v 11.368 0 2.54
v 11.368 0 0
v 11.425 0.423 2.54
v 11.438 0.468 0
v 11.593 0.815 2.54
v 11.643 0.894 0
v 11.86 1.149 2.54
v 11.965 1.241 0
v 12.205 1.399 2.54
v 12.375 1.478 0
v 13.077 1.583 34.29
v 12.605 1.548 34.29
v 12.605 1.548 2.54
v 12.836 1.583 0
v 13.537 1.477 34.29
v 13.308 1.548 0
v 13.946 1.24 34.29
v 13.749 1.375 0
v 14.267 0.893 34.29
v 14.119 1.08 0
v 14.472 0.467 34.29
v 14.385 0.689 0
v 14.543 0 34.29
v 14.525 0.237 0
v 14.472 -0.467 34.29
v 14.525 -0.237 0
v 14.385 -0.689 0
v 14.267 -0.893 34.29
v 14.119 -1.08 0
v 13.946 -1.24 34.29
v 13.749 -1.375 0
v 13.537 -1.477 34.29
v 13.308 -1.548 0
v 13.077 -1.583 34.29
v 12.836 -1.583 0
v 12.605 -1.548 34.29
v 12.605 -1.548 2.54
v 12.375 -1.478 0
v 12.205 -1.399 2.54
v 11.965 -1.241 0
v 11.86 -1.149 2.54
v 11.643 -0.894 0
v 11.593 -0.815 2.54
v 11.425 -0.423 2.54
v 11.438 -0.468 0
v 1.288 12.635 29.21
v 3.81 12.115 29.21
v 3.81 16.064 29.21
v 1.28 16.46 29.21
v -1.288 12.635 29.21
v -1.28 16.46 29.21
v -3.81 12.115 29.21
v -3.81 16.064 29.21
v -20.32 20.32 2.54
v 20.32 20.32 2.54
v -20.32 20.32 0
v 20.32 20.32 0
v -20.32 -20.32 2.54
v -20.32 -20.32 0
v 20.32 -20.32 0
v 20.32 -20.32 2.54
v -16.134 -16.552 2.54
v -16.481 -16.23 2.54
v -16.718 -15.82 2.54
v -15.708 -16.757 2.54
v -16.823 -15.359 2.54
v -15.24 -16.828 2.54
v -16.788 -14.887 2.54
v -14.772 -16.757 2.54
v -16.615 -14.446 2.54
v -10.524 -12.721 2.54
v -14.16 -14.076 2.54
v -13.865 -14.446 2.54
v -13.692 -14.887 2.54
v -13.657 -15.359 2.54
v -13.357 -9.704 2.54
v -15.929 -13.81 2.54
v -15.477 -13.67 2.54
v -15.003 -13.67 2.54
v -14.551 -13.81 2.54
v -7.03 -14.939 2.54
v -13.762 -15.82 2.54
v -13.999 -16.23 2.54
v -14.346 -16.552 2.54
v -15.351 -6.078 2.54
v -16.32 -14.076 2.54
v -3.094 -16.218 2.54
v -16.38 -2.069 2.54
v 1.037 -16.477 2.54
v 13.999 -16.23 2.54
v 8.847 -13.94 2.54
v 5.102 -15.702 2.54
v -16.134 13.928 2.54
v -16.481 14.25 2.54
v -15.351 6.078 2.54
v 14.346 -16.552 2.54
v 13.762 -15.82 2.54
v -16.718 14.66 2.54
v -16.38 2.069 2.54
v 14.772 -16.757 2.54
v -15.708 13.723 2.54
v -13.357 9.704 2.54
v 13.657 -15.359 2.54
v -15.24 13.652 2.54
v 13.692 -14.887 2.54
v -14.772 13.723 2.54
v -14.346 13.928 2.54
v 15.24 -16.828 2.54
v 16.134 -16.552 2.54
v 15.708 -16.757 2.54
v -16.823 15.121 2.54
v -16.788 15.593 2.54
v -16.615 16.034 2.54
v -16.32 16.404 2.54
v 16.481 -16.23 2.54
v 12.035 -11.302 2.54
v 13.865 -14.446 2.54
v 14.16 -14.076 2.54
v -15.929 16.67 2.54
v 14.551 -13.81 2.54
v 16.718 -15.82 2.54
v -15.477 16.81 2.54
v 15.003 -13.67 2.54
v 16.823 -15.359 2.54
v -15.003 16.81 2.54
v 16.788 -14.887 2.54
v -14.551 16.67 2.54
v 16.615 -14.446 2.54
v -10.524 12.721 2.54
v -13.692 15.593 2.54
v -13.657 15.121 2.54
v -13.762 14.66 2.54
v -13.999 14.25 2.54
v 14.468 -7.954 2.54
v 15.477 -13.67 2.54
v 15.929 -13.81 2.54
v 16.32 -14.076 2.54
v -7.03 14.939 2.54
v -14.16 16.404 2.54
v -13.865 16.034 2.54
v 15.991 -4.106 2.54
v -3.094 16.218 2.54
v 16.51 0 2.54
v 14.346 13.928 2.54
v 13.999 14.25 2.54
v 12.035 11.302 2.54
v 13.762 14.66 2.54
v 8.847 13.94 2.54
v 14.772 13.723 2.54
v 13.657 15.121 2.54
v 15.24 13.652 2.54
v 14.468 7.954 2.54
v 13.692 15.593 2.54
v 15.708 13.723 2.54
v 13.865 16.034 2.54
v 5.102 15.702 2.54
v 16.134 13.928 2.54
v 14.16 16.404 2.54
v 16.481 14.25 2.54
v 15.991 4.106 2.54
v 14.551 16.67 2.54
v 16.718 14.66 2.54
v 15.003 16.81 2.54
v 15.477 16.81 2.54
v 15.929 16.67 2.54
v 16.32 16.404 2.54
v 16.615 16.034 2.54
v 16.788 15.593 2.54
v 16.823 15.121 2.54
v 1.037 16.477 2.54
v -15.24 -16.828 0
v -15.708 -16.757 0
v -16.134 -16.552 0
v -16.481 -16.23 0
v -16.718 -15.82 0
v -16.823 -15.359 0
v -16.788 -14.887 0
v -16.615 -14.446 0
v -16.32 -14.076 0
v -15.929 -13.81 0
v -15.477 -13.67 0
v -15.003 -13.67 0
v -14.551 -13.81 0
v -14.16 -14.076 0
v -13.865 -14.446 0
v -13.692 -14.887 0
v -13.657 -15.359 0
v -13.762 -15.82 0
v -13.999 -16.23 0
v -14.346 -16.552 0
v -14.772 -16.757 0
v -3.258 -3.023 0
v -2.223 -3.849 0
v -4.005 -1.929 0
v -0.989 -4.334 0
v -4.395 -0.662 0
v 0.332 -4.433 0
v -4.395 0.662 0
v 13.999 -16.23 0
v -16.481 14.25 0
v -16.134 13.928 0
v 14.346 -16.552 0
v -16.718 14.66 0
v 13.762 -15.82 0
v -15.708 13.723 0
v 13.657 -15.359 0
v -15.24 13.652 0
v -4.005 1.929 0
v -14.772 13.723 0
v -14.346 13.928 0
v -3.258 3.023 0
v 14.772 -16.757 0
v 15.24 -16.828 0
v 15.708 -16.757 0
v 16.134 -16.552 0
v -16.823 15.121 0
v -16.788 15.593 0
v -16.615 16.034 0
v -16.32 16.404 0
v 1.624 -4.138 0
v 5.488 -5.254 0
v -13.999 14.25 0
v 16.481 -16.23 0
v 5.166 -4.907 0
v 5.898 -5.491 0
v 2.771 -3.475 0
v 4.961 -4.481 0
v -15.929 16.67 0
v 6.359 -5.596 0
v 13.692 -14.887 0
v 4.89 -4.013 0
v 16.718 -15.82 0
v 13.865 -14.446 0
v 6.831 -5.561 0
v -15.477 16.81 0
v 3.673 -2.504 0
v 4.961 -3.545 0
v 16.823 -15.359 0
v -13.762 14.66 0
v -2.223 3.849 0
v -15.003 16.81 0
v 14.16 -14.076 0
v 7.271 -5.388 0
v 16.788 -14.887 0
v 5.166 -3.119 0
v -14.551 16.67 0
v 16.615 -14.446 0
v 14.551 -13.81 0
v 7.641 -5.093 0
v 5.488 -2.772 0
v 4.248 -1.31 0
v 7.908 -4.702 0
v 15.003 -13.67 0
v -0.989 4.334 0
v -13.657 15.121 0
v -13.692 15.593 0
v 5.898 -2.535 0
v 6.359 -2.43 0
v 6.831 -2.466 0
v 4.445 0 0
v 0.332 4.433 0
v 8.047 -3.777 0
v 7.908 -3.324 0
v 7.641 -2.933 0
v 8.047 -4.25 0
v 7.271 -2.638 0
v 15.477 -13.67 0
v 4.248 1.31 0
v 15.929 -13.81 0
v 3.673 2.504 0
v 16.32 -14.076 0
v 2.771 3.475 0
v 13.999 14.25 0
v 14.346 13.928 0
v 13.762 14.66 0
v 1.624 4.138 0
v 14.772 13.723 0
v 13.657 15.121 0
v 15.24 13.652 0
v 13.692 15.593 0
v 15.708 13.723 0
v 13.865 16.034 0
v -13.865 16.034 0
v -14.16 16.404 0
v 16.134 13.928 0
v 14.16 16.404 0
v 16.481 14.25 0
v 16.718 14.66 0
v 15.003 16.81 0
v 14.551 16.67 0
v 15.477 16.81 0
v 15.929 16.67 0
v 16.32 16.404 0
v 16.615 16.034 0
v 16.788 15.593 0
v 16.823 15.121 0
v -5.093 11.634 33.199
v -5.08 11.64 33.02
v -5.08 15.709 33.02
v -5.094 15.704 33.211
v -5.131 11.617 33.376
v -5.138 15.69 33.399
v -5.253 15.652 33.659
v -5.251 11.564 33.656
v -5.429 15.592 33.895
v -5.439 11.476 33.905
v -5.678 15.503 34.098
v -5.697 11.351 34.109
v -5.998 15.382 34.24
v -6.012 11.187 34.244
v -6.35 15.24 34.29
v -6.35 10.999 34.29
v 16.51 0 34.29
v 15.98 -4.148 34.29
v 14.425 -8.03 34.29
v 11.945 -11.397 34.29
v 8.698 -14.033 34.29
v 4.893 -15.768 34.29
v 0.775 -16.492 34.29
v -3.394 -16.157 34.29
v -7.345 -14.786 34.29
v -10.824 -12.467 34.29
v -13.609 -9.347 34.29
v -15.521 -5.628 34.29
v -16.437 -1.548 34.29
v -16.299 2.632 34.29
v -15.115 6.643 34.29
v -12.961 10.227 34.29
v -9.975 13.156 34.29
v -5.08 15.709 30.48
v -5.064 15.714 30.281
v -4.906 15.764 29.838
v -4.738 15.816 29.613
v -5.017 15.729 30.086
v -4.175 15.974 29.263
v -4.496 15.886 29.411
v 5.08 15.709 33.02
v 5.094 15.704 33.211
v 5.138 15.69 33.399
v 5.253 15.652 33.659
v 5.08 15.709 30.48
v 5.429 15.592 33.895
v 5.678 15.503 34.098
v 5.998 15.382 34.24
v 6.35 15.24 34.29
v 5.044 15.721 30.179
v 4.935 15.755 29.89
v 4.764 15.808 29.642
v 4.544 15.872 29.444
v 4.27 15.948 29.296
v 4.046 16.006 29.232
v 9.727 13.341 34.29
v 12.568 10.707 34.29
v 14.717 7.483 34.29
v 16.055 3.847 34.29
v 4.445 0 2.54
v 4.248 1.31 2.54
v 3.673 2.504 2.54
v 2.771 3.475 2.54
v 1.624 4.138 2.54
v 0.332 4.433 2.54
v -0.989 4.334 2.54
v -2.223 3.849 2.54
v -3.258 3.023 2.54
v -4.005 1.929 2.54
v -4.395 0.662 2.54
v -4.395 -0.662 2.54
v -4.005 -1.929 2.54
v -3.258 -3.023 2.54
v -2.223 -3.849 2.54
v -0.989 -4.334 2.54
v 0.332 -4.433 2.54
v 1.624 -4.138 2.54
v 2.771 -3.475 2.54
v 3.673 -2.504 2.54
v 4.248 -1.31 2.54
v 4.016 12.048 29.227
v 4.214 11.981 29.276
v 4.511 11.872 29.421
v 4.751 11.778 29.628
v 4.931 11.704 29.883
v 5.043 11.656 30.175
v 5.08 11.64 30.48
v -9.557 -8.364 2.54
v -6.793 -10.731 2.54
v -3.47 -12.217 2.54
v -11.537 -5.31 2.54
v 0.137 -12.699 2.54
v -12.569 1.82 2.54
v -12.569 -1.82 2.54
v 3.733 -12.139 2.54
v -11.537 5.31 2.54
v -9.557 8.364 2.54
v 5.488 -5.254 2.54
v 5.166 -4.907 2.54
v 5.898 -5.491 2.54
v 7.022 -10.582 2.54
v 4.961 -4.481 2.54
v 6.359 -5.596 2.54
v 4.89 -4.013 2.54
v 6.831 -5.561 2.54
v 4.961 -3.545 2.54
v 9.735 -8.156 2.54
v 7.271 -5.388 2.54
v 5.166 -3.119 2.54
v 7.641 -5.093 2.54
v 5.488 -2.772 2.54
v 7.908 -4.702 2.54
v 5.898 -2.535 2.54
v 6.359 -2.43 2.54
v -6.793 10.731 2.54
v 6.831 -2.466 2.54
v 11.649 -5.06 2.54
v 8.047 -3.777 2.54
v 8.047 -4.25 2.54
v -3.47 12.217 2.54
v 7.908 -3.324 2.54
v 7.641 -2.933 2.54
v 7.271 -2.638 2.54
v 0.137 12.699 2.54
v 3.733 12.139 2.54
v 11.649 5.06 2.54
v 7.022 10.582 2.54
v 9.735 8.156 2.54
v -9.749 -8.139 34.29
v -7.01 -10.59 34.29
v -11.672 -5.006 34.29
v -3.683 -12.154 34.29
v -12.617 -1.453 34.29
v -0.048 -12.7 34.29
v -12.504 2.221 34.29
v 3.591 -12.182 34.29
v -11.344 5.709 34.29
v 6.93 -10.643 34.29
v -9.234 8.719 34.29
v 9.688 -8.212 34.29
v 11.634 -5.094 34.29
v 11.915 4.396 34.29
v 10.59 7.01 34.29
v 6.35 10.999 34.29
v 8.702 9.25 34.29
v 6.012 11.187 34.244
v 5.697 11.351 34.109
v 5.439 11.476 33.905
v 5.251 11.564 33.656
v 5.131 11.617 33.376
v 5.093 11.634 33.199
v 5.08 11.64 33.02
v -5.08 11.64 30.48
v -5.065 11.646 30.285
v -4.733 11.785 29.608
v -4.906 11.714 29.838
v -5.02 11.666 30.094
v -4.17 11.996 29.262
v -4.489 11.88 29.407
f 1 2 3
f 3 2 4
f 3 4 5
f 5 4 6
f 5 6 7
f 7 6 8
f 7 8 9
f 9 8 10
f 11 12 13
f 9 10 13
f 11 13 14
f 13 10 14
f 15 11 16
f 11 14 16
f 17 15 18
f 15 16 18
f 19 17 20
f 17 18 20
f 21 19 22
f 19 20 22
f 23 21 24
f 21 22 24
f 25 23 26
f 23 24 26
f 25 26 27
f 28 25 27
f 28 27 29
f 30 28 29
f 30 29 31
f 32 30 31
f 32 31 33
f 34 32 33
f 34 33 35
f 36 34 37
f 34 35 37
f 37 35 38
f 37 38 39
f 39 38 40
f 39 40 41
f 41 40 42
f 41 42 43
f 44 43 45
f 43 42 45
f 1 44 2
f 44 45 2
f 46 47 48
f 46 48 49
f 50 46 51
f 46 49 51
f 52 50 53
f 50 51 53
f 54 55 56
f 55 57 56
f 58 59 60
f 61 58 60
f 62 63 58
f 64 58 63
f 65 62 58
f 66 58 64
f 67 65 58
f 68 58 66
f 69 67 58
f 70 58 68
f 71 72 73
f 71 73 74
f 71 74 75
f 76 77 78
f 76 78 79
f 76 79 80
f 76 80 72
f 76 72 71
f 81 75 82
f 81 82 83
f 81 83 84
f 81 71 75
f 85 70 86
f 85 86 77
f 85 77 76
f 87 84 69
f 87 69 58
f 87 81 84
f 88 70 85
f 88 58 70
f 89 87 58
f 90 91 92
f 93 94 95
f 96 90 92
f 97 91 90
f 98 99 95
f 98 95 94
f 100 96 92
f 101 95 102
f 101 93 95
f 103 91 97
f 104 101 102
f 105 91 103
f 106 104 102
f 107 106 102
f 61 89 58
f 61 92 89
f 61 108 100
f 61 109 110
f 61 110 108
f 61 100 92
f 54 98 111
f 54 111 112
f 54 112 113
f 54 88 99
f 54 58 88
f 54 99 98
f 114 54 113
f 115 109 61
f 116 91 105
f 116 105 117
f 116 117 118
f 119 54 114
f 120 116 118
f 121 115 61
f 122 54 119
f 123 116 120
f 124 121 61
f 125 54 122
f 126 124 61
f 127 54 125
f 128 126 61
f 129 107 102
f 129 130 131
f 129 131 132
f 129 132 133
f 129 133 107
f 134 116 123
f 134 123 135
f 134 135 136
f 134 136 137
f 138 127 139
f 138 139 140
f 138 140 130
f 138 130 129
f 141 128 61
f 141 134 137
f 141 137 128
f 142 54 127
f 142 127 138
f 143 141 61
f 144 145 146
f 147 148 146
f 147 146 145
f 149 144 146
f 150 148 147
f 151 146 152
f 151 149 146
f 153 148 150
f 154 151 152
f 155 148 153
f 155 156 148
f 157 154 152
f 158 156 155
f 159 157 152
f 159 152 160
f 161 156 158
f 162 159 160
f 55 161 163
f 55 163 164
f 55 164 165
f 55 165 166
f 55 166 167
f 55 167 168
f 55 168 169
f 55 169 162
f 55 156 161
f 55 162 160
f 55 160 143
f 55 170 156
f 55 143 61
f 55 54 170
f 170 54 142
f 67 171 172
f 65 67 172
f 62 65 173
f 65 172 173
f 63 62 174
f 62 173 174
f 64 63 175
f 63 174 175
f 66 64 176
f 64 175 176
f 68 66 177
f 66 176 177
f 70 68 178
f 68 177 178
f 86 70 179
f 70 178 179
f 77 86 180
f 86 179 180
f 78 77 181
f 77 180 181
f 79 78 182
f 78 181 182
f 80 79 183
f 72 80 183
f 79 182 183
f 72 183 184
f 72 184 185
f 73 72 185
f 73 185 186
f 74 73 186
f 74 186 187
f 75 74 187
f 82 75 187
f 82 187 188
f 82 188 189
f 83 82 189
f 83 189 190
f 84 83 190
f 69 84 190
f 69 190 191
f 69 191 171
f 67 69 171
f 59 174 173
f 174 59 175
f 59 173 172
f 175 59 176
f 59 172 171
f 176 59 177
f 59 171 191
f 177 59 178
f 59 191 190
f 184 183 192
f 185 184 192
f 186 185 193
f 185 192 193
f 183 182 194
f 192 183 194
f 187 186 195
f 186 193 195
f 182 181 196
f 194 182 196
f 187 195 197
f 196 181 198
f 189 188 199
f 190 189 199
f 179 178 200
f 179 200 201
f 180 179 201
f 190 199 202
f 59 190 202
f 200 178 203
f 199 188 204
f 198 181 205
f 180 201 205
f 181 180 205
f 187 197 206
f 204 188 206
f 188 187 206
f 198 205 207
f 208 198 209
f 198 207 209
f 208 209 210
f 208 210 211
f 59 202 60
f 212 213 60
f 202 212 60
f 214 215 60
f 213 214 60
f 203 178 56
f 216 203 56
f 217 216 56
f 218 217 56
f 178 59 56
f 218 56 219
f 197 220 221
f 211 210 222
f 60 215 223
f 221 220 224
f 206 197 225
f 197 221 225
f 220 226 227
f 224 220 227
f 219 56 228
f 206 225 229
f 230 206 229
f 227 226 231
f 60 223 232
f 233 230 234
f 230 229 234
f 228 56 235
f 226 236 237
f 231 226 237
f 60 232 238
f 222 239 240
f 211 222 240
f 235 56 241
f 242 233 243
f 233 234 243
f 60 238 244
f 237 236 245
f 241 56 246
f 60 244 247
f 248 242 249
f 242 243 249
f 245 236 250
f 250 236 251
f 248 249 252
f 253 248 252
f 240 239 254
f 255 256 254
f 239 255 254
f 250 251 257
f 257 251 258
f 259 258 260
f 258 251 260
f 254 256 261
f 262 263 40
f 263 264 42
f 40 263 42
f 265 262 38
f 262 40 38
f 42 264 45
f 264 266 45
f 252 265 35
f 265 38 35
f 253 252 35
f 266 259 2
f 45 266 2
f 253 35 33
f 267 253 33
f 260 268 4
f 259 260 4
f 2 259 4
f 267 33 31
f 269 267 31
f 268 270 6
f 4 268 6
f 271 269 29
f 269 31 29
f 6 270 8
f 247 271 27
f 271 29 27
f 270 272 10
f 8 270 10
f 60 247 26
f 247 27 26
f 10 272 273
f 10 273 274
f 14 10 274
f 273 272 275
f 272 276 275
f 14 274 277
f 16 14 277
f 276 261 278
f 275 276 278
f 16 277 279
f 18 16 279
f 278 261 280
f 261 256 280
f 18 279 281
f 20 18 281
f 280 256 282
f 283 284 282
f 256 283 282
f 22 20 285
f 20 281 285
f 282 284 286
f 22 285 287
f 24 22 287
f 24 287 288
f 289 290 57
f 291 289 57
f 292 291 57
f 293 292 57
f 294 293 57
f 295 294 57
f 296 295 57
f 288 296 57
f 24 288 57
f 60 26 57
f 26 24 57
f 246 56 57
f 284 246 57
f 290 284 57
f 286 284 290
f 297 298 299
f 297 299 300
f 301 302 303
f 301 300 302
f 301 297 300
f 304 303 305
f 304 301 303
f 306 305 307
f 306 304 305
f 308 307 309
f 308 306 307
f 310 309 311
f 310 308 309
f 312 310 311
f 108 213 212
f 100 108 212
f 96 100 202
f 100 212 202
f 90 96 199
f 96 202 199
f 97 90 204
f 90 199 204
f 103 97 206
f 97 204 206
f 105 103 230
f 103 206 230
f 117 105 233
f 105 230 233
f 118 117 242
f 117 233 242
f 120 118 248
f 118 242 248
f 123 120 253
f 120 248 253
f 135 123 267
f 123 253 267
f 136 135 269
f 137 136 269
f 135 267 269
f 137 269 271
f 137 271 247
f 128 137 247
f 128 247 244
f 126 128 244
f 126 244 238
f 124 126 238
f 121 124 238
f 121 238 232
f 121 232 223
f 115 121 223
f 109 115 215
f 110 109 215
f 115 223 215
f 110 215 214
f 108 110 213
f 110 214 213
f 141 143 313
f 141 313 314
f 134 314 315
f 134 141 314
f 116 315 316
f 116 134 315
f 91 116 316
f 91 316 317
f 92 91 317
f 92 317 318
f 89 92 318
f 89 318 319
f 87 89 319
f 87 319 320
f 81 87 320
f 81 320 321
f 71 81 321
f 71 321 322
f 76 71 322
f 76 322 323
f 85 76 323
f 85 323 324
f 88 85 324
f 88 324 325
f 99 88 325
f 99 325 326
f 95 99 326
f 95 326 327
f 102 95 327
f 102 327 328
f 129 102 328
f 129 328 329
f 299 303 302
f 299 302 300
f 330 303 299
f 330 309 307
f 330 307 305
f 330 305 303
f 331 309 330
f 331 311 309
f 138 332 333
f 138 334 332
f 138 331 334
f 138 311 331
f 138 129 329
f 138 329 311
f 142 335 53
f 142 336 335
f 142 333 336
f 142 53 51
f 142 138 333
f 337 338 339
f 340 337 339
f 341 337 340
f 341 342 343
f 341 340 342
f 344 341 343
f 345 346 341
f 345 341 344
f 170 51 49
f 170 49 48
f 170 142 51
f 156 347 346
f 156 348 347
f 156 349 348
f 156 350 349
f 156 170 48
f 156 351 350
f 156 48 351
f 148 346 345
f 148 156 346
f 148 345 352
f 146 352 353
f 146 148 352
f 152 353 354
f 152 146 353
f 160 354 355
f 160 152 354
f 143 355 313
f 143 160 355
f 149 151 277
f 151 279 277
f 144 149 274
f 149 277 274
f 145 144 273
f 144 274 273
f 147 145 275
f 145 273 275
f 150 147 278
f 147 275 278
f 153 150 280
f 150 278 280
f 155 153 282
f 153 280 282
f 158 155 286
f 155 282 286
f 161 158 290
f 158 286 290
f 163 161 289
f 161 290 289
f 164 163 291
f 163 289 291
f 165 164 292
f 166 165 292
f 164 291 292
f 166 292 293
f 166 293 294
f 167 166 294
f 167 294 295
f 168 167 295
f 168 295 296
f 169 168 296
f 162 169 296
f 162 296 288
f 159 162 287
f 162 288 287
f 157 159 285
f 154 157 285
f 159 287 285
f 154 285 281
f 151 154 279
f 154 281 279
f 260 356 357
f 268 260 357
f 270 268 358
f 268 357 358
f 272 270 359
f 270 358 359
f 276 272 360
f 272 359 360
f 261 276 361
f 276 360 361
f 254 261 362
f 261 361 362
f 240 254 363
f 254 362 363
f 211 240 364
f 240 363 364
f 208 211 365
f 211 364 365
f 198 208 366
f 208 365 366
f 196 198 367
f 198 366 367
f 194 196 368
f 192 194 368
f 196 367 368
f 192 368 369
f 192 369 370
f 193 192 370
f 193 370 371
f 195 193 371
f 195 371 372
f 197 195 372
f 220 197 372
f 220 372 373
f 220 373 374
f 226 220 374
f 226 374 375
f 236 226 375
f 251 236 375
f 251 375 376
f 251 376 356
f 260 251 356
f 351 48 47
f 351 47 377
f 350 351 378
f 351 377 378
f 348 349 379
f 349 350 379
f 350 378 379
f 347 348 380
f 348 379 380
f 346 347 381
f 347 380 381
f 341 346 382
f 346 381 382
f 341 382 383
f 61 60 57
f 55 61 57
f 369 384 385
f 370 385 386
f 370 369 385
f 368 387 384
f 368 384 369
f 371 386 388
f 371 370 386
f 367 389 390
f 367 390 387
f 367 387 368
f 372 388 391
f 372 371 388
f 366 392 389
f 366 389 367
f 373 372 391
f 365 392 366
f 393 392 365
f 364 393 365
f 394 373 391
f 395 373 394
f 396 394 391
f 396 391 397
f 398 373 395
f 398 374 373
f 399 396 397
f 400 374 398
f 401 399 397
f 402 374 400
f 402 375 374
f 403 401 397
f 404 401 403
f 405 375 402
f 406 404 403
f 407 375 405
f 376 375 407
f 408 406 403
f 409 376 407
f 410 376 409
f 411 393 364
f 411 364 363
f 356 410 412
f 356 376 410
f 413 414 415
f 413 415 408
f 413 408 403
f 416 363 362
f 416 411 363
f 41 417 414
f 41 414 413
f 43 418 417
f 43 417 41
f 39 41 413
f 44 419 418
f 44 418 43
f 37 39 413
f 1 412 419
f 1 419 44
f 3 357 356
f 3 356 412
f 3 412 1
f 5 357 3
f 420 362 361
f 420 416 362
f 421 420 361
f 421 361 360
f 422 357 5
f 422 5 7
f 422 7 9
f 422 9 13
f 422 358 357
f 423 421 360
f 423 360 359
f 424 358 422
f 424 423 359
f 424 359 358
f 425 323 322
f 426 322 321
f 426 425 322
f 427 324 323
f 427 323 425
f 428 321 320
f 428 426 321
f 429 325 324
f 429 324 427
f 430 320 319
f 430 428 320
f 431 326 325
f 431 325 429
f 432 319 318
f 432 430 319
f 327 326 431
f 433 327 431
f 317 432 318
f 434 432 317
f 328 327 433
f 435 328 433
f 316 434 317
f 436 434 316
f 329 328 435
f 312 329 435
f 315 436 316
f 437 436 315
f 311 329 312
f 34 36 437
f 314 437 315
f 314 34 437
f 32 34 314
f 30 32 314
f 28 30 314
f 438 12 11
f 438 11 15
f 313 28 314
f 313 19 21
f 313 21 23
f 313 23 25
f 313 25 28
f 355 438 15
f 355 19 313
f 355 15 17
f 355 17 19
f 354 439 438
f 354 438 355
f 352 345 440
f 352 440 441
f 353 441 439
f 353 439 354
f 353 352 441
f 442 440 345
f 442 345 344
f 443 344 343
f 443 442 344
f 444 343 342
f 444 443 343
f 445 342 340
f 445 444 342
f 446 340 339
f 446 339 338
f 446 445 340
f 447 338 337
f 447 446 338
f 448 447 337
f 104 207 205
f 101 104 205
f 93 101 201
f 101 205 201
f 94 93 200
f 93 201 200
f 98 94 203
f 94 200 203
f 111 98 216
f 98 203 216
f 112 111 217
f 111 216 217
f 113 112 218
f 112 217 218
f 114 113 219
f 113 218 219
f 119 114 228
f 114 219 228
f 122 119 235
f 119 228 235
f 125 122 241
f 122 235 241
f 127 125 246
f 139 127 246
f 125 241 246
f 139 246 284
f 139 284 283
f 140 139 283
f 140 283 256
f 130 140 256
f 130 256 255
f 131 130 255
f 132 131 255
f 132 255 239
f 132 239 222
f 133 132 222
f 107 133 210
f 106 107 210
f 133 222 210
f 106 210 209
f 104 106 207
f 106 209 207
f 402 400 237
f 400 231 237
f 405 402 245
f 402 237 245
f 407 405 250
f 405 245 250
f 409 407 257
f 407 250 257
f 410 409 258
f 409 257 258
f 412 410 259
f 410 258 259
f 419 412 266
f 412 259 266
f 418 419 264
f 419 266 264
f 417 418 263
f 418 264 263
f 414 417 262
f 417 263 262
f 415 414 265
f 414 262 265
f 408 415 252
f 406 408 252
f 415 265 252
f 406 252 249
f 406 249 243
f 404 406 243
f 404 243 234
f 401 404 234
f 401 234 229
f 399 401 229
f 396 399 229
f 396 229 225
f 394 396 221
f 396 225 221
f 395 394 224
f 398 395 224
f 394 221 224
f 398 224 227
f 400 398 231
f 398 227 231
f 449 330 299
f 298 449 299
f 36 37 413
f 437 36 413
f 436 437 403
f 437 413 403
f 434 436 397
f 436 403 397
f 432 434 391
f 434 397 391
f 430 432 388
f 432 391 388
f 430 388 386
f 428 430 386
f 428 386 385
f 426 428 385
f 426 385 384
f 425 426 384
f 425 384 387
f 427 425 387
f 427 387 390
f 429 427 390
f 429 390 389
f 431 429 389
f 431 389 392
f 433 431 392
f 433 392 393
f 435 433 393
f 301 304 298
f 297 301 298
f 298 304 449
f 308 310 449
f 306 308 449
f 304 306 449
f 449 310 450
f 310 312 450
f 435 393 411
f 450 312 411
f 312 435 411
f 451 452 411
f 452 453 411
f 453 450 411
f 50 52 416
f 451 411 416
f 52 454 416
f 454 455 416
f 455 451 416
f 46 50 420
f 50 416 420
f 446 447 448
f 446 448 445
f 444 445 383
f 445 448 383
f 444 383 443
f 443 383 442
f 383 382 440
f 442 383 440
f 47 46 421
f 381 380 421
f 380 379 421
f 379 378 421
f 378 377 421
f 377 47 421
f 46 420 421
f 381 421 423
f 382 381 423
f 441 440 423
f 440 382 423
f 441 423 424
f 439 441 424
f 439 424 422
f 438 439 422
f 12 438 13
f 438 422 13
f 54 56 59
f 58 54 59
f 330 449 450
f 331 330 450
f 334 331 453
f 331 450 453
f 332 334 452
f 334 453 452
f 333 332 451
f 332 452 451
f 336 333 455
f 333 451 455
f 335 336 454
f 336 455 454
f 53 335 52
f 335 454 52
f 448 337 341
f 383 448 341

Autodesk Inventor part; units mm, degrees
ref_plane "YZ Plane" through (0, 0, 0) normal (1, 0, 0) x (0, 1, 0)
ref_plane "XY Plane" through (0, 0, 0) normal (0, 0, 1) x (1, 0, 0)
sketch "Sketch1" plane through (0, 0, 0) normal (0, 0, 1) x (1, 0, 0)
  line L0 (20.32, 20.32) -> (-20.32, 20.32)
  line L1 (-20.32, 20.32) -> (-20.32, -20.32)
  line L2 (-20.32, -20.32) -> (20.32, -20.32)
  line L3 (20.32, -20.32) -> (20.32, 20.32)
  point P0 (0, 0)
  dimension "d0" = 40.64
  dimension "d1" = 40.64
  dimension "d2" = 20.32
  dimension "d3" = 20.32
extrude "Extrusion1" add sketch "Sketch1" along normal blind 2.54
sketch "Sketch2" plane through (0, 0, 2.54) normal (0, 0, 1) x (1, 0, 0)
  circle A0 centre (0, 0) radius 12.7
  circle A1 centre (0, 0) radius 16.51
  dimension "d6" = 25.4
  dimension "d7" = 3.81
extrude "Extrusion2" add sketch "Sketch2" along normal blind 31.75
sketch "Sketch3" plane through (0, 0, 2.54) normal (0, 0, 1) x (1, 0, 0)
  line L0 (20.32, 20.32) -> (-20.32, 20.32) projected
  line L1 (-20.32, 20.32) -> (-20.32, -20.32) projected
  line L2 (20.32, -20.32) -> (20.32, 20.32) projected
  line L3 (-20.32, -20.32) -> (20.32, -20.32) projected
  point P0 (0, 0)
  point P1 (-15.24, -15.24)
  point P2 (15.24, -15.24)
  point P3 (15.24, 15.24)
  point P4 (-15.24, 15.24)
  dimension "d10" = 5.08
  dimension "d11" = 5.08
  dimension "d12" = 5.08
  dimension "d13" = 5.08
  dimension "d14" = 5.08
  dimension "d15" = 5.08
  dimension "d16" = 5.08
  dimension "d17" = 5.08
hole "Hole1" at (-15.24, -15.24, 2.54) at (15.24, -15.24, 2.54) at (15.24, 15.24, 2.54) at (-15.24, 15.24, 2.54) direction (0, 0, -1) diameter 3.175 depth 3.175 tip angle 118
ref_plane "Work Plane1" through (0, 16.51, 0) normal (0, 1, 0) x (-1, 0, 0)
sketch "Sketch4" plane through (0, 16.51, 0) normal (0, 1, 0) x (-1, 0, 0)
  line L0 (-12.7, 34.29) -> (12.7, 34.29) projected
  line L1 (5.08, 34.29) -> (-5.08, 34.29)
  line L2 (-5.08, 34.29) -> (-5.08, 29.21)
  line L3 (-5.08, 29.21) -> (5.08, 29.21)
  line L4 (5.08, 29.21) -> (5.08, 34.29)
  line L5 (0, -6.858) -> (0, 41.148) projected
  point P0 (0, 0)
  dimension "d26" = 5.08
  dimension "d27" = 10.16
  dimension "d28" = 5.08
extrude "Extrusion3" cut sketch "Sketch4" against normal blind 10.16
sketch "Sketch5" plane through (0, 0, 2.54) normal (0, 0, 1) x (1, 0, 0)
  circle A0 centre (0, 0) radius 4.445
  dimension "d31" = 8.89
extrude "Extrusion4" cut sketch "Sketch5" against normal through all
fillet "Fillet1" radius 1.27 4 edges at (-5.08, 13.6744, 29.21) (-5.08, 13.6744, 34.29) (5.08, 13.6744, 34.29) (5.08, 13.6744, 29.21)
sketch "Sketch6" plane through (0, 0, 0) normal (0, 0, -1) x (-1, 0, 0)
  circle A0 centre (-6.4775, -4.0132) radius 3.81 construction
  line L0 (20.32, -20.32) -> (-20.32, -20.32) construction
  circle A1 centre (0, 0) radius 3.81 construction
  circle A2 centre (-6.4775, -4.0132) radius 1.5875
  circle A3 centre (-12.9551, 0) radius 3.81 construction
  line L1 (20.32, 20.32) -> (20.32, -20.32) projected
  circle A4 centre (-12.9551, 0) radius 1.5875
  dimension "d35" = 16.3068
  dimension "d36" = 7.62
  dimension "d37" = 7.62
  dimension "d38" = 3.175
  dimension "d39" = 7.62
  dimension "d41" = 20.32
  dimension "d42" = 3.175
extrude "Extrusion5" cut sketch "Sketch6" against normal through all
properties part number "000114"
